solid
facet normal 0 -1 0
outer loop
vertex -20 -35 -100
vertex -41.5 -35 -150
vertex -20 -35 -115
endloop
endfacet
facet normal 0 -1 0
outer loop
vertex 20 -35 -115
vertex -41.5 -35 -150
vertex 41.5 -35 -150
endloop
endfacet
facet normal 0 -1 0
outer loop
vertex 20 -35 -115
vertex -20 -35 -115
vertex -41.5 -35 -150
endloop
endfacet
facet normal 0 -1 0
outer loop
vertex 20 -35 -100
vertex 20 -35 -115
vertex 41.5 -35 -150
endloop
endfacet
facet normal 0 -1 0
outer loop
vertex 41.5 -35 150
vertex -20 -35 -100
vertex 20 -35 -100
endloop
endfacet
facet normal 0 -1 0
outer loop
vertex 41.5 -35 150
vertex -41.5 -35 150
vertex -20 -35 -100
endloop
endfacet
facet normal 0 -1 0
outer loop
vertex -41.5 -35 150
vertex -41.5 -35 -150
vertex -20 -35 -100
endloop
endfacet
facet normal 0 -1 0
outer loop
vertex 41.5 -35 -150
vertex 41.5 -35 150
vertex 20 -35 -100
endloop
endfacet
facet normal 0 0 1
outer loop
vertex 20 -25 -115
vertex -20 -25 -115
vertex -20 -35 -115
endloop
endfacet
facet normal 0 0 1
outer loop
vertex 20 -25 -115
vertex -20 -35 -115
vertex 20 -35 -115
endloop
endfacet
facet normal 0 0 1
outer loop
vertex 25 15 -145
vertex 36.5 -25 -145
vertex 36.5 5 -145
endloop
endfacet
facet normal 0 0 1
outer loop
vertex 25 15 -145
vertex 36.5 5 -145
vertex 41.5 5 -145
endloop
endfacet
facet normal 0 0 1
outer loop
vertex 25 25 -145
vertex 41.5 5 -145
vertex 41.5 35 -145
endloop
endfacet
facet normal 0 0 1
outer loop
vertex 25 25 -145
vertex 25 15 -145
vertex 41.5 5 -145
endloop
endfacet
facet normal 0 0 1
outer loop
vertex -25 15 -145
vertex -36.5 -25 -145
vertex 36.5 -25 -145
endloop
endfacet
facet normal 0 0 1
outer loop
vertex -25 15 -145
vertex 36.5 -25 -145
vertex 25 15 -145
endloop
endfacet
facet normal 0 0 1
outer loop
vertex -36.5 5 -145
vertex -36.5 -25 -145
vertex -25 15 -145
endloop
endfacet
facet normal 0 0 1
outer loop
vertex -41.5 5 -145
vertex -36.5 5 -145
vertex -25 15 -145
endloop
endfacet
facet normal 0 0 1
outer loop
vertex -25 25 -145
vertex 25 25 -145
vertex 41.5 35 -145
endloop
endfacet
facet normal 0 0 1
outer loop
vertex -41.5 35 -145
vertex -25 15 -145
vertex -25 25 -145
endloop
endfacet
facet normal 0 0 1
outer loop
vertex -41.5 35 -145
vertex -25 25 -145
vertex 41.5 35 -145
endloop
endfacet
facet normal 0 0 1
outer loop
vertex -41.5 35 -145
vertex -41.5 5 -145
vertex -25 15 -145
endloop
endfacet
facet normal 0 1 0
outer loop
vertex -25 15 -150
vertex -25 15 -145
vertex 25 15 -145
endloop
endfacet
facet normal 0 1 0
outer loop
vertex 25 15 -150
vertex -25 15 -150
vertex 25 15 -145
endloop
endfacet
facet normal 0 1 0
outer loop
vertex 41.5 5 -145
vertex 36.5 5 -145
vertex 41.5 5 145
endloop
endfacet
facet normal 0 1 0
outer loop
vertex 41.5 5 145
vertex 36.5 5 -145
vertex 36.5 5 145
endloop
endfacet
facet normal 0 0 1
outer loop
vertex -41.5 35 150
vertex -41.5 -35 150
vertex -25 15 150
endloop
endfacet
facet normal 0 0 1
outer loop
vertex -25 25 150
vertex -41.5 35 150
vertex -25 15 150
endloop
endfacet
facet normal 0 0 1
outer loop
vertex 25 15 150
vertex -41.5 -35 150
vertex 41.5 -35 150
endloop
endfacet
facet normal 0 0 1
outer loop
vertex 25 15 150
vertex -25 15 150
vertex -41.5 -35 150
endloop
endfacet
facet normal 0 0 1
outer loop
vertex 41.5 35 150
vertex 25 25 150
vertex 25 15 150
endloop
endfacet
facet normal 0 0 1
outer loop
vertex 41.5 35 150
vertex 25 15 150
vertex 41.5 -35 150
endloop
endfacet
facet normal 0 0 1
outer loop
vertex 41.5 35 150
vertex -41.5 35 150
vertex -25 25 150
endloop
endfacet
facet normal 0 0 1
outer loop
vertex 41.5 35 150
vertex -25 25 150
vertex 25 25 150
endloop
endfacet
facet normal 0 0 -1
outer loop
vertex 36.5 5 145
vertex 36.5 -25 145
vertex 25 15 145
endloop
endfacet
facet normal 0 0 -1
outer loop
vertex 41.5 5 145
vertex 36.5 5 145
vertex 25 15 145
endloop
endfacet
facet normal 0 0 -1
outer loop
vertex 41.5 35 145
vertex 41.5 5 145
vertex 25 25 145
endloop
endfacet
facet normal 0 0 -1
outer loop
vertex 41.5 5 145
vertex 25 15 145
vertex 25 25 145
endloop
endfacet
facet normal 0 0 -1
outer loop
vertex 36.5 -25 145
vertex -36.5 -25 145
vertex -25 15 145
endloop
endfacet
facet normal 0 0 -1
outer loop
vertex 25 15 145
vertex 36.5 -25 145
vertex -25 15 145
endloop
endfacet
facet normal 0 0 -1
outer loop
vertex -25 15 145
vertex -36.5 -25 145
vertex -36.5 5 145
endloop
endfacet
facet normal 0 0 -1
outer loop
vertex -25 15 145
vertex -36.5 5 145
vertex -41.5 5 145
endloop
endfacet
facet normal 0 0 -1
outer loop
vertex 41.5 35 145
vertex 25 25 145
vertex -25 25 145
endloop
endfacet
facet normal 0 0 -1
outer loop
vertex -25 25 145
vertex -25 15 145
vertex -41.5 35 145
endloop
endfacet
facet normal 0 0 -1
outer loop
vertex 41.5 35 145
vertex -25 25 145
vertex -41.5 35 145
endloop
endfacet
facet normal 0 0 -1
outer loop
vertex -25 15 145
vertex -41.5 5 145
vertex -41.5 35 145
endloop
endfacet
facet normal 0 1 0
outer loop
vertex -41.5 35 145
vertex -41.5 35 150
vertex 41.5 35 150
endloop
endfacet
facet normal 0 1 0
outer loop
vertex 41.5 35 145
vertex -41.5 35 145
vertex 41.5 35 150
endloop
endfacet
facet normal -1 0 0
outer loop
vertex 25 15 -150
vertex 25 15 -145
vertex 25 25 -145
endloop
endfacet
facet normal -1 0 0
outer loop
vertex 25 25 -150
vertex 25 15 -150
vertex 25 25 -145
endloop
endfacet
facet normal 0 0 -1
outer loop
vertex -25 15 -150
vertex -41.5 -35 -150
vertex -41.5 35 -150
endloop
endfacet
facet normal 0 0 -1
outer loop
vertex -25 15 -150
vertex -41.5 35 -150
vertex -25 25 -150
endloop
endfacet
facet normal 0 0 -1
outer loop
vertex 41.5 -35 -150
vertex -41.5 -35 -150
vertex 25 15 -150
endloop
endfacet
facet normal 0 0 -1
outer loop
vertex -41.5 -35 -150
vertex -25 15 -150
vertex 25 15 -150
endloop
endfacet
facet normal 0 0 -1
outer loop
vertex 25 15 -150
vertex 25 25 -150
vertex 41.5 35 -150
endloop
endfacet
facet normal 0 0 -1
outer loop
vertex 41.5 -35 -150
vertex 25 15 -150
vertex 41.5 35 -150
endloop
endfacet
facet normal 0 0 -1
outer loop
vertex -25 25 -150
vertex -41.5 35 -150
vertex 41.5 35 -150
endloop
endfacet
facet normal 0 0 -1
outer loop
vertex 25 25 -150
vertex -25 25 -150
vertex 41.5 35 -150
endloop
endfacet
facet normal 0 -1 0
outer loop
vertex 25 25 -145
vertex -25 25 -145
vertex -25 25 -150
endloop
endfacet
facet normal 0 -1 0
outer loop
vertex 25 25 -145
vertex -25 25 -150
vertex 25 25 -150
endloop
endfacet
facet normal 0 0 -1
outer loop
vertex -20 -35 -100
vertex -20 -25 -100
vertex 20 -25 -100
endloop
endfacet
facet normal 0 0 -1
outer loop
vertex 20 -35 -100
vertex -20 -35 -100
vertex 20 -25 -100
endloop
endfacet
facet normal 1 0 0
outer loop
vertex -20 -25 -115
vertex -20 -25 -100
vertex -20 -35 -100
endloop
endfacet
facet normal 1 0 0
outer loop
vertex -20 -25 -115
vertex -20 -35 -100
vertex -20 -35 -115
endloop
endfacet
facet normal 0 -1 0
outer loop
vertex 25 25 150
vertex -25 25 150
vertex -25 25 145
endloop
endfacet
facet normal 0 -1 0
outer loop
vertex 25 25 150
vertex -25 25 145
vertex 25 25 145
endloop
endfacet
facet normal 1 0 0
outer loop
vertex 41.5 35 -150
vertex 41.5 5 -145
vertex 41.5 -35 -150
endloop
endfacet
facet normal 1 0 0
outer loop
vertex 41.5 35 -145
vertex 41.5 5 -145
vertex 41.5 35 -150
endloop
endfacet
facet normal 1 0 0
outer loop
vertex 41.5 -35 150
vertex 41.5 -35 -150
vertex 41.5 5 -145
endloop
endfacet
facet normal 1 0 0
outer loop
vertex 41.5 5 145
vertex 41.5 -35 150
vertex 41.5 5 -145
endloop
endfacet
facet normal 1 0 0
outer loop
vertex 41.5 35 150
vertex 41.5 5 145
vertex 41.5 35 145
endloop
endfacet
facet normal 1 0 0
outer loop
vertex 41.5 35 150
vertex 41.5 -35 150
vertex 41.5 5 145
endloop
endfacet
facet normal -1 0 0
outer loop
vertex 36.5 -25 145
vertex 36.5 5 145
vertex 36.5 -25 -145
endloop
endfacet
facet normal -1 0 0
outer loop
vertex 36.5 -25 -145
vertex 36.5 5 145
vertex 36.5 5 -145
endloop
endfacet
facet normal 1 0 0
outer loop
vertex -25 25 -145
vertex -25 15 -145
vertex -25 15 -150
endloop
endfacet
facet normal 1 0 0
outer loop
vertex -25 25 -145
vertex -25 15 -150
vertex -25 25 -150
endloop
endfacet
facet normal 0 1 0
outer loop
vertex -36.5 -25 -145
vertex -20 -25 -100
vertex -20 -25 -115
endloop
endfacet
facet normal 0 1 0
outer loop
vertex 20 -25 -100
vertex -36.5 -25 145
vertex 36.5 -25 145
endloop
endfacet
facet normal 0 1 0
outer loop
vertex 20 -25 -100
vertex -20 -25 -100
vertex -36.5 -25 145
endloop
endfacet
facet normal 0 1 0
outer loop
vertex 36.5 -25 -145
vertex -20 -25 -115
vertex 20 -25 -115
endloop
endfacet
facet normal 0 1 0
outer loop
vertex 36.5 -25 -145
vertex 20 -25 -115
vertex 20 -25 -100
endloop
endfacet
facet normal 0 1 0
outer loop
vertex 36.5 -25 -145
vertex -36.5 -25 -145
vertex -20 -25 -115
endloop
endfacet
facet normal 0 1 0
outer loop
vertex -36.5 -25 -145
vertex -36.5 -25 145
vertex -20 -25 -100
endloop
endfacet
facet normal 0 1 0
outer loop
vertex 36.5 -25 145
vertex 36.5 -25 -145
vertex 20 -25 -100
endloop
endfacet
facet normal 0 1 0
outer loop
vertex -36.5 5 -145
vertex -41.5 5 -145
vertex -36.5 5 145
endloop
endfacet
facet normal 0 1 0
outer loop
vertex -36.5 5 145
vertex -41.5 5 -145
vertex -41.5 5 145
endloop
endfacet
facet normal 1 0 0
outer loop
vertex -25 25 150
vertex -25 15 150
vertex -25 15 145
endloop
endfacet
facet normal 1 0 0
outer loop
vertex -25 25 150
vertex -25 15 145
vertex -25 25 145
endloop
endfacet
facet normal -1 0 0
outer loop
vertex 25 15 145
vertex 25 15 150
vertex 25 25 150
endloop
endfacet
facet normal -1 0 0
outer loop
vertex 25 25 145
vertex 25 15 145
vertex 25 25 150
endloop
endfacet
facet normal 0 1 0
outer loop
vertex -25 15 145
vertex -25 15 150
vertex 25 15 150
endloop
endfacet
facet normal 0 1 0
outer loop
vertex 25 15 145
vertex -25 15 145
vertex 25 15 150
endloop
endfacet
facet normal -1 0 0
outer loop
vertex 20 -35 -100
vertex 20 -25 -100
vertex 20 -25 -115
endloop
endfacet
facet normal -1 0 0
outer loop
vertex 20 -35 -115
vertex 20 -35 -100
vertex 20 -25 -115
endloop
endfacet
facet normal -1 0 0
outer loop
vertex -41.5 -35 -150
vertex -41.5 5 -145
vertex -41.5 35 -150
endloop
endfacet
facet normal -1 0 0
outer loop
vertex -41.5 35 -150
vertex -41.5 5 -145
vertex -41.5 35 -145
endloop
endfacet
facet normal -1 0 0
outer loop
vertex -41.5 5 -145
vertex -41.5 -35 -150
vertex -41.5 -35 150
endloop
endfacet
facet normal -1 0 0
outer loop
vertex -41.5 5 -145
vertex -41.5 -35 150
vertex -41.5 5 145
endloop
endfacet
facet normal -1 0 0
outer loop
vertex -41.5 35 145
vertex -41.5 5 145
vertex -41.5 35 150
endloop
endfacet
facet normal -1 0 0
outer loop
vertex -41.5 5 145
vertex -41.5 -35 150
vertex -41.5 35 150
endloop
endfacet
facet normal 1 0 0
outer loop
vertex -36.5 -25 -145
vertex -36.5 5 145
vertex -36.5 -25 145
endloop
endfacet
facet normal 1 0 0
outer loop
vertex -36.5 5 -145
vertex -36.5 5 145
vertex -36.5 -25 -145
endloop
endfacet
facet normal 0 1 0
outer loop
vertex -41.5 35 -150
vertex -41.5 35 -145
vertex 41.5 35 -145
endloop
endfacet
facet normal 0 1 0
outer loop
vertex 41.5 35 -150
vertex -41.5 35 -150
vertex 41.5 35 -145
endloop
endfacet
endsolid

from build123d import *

# Parameters (mm, degrees)
SKETCH1_W           = 83
SKETCH1_H           = 70
BOSS_EXTRUDE1_DEPTH = 150
SKETCH2_W           = 73
SKETCH2_H           = 290
CUT_EXTRUDE1_DEPTH  = 60
SKETCH3_W           = 290
SKETCH3_H           = 30
CUT_EXTRUDE2_DEPTH  = 109
SKETCH4_W           = 50
SKETCH4_H           = 10
CUT_EXTRUDE3_DEPTH  = 343
SKETCH5_W           = 40
SKETCH5_H           = 15
CUT_EXTRUDE4_DEPTH  = 343


with BuildPart() as part:
    # Sketch1 → Boss-Extrude1 (new, symmetric)
    with BuildSketch(Plane.XY):
        Rectangle(SKETCH1_W, SKETCH1_H)
    extrude(amount=BOSS_EXTRUDE1_DEPTH, both=True)

    # Sketch2 → Cut-Extrude1 (cut)
    with BuildSketch(Plane(origin=(0, 35, 0), x_dir=(1, 0, 0), z_dir=(0, 1, 0))):
        Rectangle(SKETCH2_W, SKETCH2_H)
    extrude(amount=-CUT_EXTRUDE1_DEPTH, mode=Mode.SUBTRACT)

    # Sketch3 → Cut-Extrude2 (cut)
    with BuildSketch(Plane.ZY.offset(41.5)):
        with Locations((0, 20)):
            Rectangle(SKETCH3_W, SKETCH3_H)
    extrude(amount=-CUT_EXTRUDE2_DEPTH, mode=Mode.SUBTRACT)

    # Sketch4 → Cut-Extrude3 (cut)
    with BuildSketch(Plane.XY.offset(150)):
        with Locations((0, 20)):
            Rectangle(SKETCH4_W, SKETCH4_H)
    extrude(amount=-CUT_EXTRUDE3_DEPTH, mode=Mode.SUBTRACT)

    # Sketch5 → Cut-Extrude4 (cut)
    with BuildSketch(Plane(origin=(0, -25, 0), x_dir=(1, 0, 0), z_dir=(0, 1, 0))):
        with Locations((0, 107.5)):
            Rectangle(SKETCH5_W, SKETCH5_H)
    extrude(amount=-CUT_EXTRUDE4_DEPTH, mode=Mode.SUBTRACT)


solid = part.part
